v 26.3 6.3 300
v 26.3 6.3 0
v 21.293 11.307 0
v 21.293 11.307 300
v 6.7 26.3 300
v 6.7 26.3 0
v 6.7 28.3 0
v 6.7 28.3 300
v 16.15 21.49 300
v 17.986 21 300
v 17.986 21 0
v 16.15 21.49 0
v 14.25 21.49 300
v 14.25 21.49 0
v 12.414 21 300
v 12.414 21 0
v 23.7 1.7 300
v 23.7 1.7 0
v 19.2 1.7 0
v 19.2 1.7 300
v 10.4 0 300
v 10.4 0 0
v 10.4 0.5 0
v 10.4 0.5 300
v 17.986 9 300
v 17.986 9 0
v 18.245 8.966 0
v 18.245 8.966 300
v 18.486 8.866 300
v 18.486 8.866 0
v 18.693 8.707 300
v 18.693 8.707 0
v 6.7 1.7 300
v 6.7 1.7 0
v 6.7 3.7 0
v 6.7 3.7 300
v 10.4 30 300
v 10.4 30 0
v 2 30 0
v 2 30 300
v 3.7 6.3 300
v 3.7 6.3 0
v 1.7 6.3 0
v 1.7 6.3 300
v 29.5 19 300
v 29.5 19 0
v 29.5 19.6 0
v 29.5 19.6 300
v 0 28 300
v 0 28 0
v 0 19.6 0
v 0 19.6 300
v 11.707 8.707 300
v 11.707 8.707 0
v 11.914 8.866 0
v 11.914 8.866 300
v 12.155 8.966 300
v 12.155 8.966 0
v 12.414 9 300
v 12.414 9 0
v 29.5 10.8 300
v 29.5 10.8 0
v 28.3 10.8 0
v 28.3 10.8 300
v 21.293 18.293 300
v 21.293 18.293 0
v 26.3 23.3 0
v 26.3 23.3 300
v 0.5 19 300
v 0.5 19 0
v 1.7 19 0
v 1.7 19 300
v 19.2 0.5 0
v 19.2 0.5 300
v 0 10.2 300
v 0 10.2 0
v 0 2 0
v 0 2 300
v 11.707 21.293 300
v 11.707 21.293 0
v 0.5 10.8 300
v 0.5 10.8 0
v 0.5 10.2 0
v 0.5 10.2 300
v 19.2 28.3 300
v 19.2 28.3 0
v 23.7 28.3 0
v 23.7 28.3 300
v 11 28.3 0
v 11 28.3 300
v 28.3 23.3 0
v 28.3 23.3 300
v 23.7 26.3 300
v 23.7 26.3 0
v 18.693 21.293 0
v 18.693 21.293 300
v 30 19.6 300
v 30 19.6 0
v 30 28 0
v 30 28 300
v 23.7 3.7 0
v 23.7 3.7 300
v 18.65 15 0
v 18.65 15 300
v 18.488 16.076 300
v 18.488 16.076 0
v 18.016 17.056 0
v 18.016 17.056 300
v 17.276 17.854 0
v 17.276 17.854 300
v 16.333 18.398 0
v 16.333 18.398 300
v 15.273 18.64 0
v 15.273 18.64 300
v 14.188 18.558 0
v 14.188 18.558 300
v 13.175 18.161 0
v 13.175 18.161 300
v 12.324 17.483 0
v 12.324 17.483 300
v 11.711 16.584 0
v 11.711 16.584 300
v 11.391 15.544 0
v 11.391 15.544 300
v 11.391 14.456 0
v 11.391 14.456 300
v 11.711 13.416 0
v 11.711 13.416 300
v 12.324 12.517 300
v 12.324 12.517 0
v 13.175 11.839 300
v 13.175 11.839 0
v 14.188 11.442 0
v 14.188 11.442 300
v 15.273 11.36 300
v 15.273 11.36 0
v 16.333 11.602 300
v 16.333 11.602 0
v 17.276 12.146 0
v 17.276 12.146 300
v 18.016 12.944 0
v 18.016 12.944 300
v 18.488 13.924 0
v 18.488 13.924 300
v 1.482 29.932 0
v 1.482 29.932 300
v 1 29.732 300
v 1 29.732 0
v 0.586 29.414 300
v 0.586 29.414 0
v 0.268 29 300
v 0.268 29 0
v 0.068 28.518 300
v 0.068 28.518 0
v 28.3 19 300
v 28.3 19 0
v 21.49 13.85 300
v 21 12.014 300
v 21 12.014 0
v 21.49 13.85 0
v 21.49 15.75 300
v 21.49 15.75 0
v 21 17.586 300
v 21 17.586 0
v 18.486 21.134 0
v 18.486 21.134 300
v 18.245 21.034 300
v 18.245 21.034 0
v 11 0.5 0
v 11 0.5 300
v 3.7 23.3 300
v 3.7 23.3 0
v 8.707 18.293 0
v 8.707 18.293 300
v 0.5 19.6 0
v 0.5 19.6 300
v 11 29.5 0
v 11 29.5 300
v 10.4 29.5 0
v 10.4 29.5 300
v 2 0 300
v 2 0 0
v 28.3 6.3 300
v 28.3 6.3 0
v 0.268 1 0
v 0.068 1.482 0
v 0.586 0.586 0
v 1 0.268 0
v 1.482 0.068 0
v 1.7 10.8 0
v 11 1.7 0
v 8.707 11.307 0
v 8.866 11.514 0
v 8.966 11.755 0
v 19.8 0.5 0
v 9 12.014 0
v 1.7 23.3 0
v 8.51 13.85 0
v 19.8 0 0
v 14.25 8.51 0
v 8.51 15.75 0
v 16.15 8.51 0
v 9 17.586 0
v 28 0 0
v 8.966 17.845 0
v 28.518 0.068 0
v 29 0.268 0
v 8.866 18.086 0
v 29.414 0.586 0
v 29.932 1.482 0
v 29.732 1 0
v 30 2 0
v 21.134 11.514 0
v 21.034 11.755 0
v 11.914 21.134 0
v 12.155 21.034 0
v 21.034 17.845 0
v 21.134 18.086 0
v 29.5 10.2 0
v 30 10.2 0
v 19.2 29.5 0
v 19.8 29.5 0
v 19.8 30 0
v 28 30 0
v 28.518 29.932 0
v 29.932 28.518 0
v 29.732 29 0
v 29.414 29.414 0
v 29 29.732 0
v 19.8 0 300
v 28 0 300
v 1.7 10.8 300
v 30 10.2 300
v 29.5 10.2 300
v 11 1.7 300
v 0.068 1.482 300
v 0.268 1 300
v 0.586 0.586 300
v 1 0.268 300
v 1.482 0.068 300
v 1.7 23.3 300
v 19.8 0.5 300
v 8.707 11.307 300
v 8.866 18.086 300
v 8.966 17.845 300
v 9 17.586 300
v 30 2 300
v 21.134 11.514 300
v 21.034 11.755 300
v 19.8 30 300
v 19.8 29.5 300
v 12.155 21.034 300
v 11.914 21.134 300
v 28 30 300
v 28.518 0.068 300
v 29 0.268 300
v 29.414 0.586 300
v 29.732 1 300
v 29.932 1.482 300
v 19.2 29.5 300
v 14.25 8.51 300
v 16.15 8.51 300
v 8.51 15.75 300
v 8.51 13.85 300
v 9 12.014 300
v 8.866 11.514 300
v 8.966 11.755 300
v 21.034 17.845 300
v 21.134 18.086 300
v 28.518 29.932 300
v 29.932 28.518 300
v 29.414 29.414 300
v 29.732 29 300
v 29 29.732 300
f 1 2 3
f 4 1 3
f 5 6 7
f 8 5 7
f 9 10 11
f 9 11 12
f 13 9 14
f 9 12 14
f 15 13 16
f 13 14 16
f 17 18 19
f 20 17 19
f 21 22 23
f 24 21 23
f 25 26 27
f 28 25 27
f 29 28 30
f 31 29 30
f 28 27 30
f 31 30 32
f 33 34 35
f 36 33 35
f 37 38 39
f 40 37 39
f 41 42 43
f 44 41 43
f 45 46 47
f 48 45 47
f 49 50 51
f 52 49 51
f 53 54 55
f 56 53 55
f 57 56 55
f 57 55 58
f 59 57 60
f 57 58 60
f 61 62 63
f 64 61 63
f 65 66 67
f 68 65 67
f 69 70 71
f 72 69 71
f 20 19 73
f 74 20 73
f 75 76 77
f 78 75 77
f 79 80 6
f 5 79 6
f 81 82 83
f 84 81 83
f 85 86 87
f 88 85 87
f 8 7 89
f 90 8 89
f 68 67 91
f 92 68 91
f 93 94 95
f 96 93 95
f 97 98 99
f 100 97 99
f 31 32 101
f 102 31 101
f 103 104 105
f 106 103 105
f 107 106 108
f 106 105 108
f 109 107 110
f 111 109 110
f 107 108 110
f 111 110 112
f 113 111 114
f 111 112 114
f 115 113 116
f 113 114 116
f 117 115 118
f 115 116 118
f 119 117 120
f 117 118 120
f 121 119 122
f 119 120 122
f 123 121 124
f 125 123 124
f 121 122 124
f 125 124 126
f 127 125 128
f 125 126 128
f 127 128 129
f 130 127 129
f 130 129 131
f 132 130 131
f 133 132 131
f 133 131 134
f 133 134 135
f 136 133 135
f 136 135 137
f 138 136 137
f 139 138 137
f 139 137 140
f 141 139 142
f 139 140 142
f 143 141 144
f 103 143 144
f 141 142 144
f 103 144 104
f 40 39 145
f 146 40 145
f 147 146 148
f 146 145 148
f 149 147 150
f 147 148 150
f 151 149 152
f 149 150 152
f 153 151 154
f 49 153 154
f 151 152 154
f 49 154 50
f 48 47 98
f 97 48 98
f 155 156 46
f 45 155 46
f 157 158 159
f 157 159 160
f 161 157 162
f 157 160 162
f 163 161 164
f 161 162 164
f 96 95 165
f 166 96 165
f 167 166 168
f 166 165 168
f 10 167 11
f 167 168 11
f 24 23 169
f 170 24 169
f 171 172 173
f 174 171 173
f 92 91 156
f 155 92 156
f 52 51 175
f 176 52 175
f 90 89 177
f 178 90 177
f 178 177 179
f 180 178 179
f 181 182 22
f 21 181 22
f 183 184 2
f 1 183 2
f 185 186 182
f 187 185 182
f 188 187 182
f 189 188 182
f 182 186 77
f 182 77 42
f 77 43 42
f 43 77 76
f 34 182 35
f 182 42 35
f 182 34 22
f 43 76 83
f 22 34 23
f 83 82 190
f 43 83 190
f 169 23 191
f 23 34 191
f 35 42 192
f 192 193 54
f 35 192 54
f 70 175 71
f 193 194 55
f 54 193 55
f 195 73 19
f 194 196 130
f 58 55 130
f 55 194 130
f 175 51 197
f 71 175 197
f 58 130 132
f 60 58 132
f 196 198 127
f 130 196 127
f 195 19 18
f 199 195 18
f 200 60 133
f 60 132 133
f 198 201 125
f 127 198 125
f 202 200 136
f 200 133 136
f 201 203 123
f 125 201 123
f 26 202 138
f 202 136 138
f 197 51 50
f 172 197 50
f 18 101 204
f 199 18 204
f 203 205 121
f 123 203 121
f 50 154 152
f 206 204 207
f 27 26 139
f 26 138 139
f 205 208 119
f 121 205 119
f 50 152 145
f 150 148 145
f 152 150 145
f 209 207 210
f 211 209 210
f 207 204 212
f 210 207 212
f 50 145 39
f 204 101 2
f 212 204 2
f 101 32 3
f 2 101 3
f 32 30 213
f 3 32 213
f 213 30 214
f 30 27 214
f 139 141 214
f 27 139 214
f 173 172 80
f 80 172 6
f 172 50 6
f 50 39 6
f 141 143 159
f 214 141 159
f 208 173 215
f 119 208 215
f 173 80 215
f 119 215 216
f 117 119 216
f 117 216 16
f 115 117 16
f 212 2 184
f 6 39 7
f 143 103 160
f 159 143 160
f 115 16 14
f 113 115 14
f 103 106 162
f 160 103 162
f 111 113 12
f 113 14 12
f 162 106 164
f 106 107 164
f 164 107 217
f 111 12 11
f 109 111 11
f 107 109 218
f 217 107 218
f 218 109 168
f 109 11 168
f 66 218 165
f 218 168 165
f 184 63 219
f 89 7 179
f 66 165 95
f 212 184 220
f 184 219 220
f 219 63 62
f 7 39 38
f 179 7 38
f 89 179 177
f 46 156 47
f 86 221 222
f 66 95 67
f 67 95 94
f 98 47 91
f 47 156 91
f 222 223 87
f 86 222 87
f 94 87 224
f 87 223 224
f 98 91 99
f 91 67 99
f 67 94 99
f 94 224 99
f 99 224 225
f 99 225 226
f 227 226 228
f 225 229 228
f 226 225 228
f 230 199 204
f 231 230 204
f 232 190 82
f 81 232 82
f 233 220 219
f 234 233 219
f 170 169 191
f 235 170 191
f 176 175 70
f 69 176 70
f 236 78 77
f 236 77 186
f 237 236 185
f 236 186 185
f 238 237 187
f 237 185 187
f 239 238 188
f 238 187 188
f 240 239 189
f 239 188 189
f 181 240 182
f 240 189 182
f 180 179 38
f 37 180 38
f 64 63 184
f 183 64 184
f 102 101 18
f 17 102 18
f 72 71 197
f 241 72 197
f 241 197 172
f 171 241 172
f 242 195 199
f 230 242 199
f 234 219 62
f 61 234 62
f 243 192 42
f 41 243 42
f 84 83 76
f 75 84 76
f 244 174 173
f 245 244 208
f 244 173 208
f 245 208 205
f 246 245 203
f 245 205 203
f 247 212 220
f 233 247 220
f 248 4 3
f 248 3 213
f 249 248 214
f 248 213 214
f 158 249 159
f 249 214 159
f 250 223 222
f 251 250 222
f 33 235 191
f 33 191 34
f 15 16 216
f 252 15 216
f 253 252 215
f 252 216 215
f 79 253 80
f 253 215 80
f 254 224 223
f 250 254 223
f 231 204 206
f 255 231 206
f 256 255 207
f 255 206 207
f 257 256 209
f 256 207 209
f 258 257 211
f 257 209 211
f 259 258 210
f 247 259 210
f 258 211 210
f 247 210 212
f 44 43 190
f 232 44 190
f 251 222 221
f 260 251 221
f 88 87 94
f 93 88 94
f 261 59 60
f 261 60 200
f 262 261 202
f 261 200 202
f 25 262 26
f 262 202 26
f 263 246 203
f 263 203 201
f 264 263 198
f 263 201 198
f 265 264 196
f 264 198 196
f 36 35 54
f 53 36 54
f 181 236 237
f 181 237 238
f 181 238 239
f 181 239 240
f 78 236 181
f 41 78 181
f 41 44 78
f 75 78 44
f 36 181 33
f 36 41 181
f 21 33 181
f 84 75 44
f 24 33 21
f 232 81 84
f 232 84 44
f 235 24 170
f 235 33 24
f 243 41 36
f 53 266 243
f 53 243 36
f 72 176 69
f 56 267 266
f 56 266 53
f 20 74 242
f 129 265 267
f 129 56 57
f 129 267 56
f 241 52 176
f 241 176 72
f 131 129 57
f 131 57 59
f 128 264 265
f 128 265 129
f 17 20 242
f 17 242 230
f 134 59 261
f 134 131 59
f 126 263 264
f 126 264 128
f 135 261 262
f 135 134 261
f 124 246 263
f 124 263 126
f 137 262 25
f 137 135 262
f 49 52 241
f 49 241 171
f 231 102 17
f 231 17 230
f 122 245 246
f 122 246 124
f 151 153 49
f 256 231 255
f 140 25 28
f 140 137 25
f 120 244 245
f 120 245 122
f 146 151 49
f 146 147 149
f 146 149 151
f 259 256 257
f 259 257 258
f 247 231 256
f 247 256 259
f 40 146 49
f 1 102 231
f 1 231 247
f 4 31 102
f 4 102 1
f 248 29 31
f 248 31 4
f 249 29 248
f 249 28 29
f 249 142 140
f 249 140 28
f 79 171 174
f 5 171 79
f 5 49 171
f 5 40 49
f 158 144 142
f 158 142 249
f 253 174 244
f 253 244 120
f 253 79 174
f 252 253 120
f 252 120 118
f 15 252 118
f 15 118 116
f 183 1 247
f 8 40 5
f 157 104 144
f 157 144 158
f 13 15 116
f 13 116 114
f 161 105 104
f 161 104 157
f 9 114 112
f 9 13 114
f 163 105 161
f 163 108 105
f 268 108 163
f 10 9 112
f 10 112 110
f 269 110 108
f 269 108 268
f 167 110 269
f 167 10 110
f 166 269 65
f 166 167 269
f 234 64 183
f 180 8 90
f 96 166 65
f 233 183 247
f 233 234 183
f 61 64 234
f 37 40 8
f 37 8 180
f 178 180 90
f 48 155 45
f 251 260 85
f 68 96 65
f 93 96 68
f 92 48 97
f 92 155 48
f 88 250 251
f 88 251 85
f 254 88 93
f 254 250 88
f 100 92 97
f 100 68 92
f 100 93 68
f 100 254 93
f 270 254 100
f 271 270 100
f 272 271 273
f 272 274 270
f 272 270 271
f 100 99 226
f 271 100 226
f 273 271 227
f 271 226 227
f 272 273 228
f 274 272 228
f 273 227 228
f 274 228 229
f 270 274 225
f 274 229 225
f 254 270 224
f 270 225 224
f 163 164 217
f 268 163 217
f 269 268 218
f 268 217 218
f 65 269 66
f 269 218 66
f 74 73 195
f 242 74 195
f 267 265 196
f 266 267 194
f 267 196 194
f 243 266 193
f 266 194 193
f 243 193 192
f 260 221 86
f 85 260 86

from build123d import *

# Parameters (mm, degrees)
F1_DEPTH = 300
F2_R     = 3.65
F3_DEPTH = 300


with BuildPart() as f1:
    # F0 (on Top) → F1 (new body)
    with BuildSketch(Plane.XY):
        with BuildLine():
            ThreePointArc((0, 2), (0.585786, 0.585786), (2, 0))
            Line((2, 0), (10.4, 0))
            Line((10.4, 0), (10.4, 0.5))
            Line((10.4, 0.5), (11, 0.5))
            Line((11, 0.5), (11, 1.7))
            Line((11, 1.7), (6.7, 1.7))
            Line((6.7, 1.7), (6.7, 3.7))
            Line((6.7, 3.7), (11.707107, 8.707107))
            ThreePointArc((11.707107, 8.707107), (12.03153, 8.92388), (12.414214, 9))
            ThreePointArc((12.414214, 9), (15.2, 8.447547), (17.985786, 9))
            ThreePointArc((17.985786, 9), (18.36847, 8.92388), (18.692893, 8.707107))
            Line((18.692893, 8.707107), (23.7, 3.7))
            Line((23.7, 3.7), (23.7, 1.7))
            Line((23.7, 1.7), (19.2, 1.7))
            Line((19.2, 1.7), (19.2, 0.5))
            Line((19.2, 0.5), (19.8, 0.5))
            Line((19.8, 0.5), (19.8, 0))
            Line((19.8, 0), (28, 0))
            ThreePointArc((28, 0), (29.414214, 0.585786), (30, 2))
            Line((30, 2), (30, 10.2))
            Line((30, 10.2), (29.5, 10.2))
            Line((29.5, 10.2), (29.5, 10.8))
            Line((29.5, 10.8), (28.3, 10.8))
            Line((28.3, 10.8), (28.3, 6.3))
            Line((28.3, 6.3), (26.3, 6.3))
            Line((26.3, 6.3), (21.292893, 11.307107))
            ThreePointArc((21.292893, 11.307107), (21.07612, 11.63153), (21, 12.014214))
            ThreePointArc((21, 12.014214), (21.552453, 14.8), (21, 17.585786))
            ThreePointArc((21, 17.585786), (21.07612, 17.96847), (21.292893, 18.292893))
            Line((21.292893, 18.292893), (26.3, 23.3))
            Line((26.3, 23.3), (28.3, 23.3))
            Line((28.3, 23.3), (28.3, 19))
            Line((28.3, 19), (29.5, 19))
            Line((29.5, 19), (29.5, 19.6))
            Line((29.5, 19.6), (30, 19.6))
            Line((30, 19.6), (30, 28))
            ThreePointArc((30, 28), (29.414214, 29.414214), (28, 30))
            Line((28, 30), (19.8, 30))
            Line((19.8, 30), (19.8, 29.5))
            Line((19.8, 29.5), (19.2, 29.5))
            Line((19.2, 29.5), (19.2, 28.3))
            Line((19.2, 28.3), (23.7, 28.3))
            Line((23.7, 28.3), (23.7, 26.3))
            Line((23.7, 26.3), (18.692893, 21.292893))
            ThreePointArc((18.692893, 21.292893), (18.36847, 21.07612), (17.985786, 21))
            ThreePointArc((17.985786, 21), (15.2, 21.552453), (12.414214, 21))
            ThreePointArc((12.414214, 21), (12.03153, 21.07612), (11.707107, 21.292893))
            Line((11.707107, 21.292893), (6.7, 26.3))
            Line((6.7, 26.3), (6.7, 28.3))
            Line((6.7, 28.3), (11, 28.3))
            Line((11, 28.3), (11, 29.5))
            Line((11, 29.5), (10.4, 29.5))
            Line((10.4, 29.5), (10.4, 30))
            Line((10.4, 30), (2, 30))
            ThreePointArc((2, 30), (0.585786, 29.414214), (0, 28))
            Line((0, 28), (0, 19.6))
            Line((0, 19.6), (0.5, 19.6))
            Line((0.5, 19.6), (0.5, 19))
            Line((0.5, 19), (1.7, 19))
            Line((1.7, 19), (1.7, 23.3))
            Line((1.7, 23.3), (3.7, 23.3))
            Line((3.7, 23.3), (8.707107, 18.292893))
            ThreePointArc((8.707107, 18.292893), (8.92388, 17.96847), (9, 17.585786))
            ThreePointArc((9, 17.585786), (8.447547, 14.8), (9, 12.014214))
            ThreePointArc((9, 12.014214), (8.92388, 11.63153), (8.707107, 11.307107))
            Line((8.707107, 11.307107), (3.7, 6.3))
            Line((3.7, 6.3), (1.7, 6.3))
            Line((1.7, 6.3), (1.7, 10.8))
            Line((1.7, 10.8), (0.5, 10.8))
            Line((0.5, 10.8), (0.5, 10.2))
            Line((0.5, 10.2), (0, 10.2))
            Line((0, 10.2), (0, 2))
        make_face()
    extrude(amount=F1_DEPTH)

    # F2 (on face) → F3 (cut)
    with BuildSketch(Plane.XY.offset(300)):
        with Locations((15, 15)):
            Circle(F2_R)
    extrude(amount=-F3_DEPTH, mode=Mode.SUBTRACT)


solid = f1.part
